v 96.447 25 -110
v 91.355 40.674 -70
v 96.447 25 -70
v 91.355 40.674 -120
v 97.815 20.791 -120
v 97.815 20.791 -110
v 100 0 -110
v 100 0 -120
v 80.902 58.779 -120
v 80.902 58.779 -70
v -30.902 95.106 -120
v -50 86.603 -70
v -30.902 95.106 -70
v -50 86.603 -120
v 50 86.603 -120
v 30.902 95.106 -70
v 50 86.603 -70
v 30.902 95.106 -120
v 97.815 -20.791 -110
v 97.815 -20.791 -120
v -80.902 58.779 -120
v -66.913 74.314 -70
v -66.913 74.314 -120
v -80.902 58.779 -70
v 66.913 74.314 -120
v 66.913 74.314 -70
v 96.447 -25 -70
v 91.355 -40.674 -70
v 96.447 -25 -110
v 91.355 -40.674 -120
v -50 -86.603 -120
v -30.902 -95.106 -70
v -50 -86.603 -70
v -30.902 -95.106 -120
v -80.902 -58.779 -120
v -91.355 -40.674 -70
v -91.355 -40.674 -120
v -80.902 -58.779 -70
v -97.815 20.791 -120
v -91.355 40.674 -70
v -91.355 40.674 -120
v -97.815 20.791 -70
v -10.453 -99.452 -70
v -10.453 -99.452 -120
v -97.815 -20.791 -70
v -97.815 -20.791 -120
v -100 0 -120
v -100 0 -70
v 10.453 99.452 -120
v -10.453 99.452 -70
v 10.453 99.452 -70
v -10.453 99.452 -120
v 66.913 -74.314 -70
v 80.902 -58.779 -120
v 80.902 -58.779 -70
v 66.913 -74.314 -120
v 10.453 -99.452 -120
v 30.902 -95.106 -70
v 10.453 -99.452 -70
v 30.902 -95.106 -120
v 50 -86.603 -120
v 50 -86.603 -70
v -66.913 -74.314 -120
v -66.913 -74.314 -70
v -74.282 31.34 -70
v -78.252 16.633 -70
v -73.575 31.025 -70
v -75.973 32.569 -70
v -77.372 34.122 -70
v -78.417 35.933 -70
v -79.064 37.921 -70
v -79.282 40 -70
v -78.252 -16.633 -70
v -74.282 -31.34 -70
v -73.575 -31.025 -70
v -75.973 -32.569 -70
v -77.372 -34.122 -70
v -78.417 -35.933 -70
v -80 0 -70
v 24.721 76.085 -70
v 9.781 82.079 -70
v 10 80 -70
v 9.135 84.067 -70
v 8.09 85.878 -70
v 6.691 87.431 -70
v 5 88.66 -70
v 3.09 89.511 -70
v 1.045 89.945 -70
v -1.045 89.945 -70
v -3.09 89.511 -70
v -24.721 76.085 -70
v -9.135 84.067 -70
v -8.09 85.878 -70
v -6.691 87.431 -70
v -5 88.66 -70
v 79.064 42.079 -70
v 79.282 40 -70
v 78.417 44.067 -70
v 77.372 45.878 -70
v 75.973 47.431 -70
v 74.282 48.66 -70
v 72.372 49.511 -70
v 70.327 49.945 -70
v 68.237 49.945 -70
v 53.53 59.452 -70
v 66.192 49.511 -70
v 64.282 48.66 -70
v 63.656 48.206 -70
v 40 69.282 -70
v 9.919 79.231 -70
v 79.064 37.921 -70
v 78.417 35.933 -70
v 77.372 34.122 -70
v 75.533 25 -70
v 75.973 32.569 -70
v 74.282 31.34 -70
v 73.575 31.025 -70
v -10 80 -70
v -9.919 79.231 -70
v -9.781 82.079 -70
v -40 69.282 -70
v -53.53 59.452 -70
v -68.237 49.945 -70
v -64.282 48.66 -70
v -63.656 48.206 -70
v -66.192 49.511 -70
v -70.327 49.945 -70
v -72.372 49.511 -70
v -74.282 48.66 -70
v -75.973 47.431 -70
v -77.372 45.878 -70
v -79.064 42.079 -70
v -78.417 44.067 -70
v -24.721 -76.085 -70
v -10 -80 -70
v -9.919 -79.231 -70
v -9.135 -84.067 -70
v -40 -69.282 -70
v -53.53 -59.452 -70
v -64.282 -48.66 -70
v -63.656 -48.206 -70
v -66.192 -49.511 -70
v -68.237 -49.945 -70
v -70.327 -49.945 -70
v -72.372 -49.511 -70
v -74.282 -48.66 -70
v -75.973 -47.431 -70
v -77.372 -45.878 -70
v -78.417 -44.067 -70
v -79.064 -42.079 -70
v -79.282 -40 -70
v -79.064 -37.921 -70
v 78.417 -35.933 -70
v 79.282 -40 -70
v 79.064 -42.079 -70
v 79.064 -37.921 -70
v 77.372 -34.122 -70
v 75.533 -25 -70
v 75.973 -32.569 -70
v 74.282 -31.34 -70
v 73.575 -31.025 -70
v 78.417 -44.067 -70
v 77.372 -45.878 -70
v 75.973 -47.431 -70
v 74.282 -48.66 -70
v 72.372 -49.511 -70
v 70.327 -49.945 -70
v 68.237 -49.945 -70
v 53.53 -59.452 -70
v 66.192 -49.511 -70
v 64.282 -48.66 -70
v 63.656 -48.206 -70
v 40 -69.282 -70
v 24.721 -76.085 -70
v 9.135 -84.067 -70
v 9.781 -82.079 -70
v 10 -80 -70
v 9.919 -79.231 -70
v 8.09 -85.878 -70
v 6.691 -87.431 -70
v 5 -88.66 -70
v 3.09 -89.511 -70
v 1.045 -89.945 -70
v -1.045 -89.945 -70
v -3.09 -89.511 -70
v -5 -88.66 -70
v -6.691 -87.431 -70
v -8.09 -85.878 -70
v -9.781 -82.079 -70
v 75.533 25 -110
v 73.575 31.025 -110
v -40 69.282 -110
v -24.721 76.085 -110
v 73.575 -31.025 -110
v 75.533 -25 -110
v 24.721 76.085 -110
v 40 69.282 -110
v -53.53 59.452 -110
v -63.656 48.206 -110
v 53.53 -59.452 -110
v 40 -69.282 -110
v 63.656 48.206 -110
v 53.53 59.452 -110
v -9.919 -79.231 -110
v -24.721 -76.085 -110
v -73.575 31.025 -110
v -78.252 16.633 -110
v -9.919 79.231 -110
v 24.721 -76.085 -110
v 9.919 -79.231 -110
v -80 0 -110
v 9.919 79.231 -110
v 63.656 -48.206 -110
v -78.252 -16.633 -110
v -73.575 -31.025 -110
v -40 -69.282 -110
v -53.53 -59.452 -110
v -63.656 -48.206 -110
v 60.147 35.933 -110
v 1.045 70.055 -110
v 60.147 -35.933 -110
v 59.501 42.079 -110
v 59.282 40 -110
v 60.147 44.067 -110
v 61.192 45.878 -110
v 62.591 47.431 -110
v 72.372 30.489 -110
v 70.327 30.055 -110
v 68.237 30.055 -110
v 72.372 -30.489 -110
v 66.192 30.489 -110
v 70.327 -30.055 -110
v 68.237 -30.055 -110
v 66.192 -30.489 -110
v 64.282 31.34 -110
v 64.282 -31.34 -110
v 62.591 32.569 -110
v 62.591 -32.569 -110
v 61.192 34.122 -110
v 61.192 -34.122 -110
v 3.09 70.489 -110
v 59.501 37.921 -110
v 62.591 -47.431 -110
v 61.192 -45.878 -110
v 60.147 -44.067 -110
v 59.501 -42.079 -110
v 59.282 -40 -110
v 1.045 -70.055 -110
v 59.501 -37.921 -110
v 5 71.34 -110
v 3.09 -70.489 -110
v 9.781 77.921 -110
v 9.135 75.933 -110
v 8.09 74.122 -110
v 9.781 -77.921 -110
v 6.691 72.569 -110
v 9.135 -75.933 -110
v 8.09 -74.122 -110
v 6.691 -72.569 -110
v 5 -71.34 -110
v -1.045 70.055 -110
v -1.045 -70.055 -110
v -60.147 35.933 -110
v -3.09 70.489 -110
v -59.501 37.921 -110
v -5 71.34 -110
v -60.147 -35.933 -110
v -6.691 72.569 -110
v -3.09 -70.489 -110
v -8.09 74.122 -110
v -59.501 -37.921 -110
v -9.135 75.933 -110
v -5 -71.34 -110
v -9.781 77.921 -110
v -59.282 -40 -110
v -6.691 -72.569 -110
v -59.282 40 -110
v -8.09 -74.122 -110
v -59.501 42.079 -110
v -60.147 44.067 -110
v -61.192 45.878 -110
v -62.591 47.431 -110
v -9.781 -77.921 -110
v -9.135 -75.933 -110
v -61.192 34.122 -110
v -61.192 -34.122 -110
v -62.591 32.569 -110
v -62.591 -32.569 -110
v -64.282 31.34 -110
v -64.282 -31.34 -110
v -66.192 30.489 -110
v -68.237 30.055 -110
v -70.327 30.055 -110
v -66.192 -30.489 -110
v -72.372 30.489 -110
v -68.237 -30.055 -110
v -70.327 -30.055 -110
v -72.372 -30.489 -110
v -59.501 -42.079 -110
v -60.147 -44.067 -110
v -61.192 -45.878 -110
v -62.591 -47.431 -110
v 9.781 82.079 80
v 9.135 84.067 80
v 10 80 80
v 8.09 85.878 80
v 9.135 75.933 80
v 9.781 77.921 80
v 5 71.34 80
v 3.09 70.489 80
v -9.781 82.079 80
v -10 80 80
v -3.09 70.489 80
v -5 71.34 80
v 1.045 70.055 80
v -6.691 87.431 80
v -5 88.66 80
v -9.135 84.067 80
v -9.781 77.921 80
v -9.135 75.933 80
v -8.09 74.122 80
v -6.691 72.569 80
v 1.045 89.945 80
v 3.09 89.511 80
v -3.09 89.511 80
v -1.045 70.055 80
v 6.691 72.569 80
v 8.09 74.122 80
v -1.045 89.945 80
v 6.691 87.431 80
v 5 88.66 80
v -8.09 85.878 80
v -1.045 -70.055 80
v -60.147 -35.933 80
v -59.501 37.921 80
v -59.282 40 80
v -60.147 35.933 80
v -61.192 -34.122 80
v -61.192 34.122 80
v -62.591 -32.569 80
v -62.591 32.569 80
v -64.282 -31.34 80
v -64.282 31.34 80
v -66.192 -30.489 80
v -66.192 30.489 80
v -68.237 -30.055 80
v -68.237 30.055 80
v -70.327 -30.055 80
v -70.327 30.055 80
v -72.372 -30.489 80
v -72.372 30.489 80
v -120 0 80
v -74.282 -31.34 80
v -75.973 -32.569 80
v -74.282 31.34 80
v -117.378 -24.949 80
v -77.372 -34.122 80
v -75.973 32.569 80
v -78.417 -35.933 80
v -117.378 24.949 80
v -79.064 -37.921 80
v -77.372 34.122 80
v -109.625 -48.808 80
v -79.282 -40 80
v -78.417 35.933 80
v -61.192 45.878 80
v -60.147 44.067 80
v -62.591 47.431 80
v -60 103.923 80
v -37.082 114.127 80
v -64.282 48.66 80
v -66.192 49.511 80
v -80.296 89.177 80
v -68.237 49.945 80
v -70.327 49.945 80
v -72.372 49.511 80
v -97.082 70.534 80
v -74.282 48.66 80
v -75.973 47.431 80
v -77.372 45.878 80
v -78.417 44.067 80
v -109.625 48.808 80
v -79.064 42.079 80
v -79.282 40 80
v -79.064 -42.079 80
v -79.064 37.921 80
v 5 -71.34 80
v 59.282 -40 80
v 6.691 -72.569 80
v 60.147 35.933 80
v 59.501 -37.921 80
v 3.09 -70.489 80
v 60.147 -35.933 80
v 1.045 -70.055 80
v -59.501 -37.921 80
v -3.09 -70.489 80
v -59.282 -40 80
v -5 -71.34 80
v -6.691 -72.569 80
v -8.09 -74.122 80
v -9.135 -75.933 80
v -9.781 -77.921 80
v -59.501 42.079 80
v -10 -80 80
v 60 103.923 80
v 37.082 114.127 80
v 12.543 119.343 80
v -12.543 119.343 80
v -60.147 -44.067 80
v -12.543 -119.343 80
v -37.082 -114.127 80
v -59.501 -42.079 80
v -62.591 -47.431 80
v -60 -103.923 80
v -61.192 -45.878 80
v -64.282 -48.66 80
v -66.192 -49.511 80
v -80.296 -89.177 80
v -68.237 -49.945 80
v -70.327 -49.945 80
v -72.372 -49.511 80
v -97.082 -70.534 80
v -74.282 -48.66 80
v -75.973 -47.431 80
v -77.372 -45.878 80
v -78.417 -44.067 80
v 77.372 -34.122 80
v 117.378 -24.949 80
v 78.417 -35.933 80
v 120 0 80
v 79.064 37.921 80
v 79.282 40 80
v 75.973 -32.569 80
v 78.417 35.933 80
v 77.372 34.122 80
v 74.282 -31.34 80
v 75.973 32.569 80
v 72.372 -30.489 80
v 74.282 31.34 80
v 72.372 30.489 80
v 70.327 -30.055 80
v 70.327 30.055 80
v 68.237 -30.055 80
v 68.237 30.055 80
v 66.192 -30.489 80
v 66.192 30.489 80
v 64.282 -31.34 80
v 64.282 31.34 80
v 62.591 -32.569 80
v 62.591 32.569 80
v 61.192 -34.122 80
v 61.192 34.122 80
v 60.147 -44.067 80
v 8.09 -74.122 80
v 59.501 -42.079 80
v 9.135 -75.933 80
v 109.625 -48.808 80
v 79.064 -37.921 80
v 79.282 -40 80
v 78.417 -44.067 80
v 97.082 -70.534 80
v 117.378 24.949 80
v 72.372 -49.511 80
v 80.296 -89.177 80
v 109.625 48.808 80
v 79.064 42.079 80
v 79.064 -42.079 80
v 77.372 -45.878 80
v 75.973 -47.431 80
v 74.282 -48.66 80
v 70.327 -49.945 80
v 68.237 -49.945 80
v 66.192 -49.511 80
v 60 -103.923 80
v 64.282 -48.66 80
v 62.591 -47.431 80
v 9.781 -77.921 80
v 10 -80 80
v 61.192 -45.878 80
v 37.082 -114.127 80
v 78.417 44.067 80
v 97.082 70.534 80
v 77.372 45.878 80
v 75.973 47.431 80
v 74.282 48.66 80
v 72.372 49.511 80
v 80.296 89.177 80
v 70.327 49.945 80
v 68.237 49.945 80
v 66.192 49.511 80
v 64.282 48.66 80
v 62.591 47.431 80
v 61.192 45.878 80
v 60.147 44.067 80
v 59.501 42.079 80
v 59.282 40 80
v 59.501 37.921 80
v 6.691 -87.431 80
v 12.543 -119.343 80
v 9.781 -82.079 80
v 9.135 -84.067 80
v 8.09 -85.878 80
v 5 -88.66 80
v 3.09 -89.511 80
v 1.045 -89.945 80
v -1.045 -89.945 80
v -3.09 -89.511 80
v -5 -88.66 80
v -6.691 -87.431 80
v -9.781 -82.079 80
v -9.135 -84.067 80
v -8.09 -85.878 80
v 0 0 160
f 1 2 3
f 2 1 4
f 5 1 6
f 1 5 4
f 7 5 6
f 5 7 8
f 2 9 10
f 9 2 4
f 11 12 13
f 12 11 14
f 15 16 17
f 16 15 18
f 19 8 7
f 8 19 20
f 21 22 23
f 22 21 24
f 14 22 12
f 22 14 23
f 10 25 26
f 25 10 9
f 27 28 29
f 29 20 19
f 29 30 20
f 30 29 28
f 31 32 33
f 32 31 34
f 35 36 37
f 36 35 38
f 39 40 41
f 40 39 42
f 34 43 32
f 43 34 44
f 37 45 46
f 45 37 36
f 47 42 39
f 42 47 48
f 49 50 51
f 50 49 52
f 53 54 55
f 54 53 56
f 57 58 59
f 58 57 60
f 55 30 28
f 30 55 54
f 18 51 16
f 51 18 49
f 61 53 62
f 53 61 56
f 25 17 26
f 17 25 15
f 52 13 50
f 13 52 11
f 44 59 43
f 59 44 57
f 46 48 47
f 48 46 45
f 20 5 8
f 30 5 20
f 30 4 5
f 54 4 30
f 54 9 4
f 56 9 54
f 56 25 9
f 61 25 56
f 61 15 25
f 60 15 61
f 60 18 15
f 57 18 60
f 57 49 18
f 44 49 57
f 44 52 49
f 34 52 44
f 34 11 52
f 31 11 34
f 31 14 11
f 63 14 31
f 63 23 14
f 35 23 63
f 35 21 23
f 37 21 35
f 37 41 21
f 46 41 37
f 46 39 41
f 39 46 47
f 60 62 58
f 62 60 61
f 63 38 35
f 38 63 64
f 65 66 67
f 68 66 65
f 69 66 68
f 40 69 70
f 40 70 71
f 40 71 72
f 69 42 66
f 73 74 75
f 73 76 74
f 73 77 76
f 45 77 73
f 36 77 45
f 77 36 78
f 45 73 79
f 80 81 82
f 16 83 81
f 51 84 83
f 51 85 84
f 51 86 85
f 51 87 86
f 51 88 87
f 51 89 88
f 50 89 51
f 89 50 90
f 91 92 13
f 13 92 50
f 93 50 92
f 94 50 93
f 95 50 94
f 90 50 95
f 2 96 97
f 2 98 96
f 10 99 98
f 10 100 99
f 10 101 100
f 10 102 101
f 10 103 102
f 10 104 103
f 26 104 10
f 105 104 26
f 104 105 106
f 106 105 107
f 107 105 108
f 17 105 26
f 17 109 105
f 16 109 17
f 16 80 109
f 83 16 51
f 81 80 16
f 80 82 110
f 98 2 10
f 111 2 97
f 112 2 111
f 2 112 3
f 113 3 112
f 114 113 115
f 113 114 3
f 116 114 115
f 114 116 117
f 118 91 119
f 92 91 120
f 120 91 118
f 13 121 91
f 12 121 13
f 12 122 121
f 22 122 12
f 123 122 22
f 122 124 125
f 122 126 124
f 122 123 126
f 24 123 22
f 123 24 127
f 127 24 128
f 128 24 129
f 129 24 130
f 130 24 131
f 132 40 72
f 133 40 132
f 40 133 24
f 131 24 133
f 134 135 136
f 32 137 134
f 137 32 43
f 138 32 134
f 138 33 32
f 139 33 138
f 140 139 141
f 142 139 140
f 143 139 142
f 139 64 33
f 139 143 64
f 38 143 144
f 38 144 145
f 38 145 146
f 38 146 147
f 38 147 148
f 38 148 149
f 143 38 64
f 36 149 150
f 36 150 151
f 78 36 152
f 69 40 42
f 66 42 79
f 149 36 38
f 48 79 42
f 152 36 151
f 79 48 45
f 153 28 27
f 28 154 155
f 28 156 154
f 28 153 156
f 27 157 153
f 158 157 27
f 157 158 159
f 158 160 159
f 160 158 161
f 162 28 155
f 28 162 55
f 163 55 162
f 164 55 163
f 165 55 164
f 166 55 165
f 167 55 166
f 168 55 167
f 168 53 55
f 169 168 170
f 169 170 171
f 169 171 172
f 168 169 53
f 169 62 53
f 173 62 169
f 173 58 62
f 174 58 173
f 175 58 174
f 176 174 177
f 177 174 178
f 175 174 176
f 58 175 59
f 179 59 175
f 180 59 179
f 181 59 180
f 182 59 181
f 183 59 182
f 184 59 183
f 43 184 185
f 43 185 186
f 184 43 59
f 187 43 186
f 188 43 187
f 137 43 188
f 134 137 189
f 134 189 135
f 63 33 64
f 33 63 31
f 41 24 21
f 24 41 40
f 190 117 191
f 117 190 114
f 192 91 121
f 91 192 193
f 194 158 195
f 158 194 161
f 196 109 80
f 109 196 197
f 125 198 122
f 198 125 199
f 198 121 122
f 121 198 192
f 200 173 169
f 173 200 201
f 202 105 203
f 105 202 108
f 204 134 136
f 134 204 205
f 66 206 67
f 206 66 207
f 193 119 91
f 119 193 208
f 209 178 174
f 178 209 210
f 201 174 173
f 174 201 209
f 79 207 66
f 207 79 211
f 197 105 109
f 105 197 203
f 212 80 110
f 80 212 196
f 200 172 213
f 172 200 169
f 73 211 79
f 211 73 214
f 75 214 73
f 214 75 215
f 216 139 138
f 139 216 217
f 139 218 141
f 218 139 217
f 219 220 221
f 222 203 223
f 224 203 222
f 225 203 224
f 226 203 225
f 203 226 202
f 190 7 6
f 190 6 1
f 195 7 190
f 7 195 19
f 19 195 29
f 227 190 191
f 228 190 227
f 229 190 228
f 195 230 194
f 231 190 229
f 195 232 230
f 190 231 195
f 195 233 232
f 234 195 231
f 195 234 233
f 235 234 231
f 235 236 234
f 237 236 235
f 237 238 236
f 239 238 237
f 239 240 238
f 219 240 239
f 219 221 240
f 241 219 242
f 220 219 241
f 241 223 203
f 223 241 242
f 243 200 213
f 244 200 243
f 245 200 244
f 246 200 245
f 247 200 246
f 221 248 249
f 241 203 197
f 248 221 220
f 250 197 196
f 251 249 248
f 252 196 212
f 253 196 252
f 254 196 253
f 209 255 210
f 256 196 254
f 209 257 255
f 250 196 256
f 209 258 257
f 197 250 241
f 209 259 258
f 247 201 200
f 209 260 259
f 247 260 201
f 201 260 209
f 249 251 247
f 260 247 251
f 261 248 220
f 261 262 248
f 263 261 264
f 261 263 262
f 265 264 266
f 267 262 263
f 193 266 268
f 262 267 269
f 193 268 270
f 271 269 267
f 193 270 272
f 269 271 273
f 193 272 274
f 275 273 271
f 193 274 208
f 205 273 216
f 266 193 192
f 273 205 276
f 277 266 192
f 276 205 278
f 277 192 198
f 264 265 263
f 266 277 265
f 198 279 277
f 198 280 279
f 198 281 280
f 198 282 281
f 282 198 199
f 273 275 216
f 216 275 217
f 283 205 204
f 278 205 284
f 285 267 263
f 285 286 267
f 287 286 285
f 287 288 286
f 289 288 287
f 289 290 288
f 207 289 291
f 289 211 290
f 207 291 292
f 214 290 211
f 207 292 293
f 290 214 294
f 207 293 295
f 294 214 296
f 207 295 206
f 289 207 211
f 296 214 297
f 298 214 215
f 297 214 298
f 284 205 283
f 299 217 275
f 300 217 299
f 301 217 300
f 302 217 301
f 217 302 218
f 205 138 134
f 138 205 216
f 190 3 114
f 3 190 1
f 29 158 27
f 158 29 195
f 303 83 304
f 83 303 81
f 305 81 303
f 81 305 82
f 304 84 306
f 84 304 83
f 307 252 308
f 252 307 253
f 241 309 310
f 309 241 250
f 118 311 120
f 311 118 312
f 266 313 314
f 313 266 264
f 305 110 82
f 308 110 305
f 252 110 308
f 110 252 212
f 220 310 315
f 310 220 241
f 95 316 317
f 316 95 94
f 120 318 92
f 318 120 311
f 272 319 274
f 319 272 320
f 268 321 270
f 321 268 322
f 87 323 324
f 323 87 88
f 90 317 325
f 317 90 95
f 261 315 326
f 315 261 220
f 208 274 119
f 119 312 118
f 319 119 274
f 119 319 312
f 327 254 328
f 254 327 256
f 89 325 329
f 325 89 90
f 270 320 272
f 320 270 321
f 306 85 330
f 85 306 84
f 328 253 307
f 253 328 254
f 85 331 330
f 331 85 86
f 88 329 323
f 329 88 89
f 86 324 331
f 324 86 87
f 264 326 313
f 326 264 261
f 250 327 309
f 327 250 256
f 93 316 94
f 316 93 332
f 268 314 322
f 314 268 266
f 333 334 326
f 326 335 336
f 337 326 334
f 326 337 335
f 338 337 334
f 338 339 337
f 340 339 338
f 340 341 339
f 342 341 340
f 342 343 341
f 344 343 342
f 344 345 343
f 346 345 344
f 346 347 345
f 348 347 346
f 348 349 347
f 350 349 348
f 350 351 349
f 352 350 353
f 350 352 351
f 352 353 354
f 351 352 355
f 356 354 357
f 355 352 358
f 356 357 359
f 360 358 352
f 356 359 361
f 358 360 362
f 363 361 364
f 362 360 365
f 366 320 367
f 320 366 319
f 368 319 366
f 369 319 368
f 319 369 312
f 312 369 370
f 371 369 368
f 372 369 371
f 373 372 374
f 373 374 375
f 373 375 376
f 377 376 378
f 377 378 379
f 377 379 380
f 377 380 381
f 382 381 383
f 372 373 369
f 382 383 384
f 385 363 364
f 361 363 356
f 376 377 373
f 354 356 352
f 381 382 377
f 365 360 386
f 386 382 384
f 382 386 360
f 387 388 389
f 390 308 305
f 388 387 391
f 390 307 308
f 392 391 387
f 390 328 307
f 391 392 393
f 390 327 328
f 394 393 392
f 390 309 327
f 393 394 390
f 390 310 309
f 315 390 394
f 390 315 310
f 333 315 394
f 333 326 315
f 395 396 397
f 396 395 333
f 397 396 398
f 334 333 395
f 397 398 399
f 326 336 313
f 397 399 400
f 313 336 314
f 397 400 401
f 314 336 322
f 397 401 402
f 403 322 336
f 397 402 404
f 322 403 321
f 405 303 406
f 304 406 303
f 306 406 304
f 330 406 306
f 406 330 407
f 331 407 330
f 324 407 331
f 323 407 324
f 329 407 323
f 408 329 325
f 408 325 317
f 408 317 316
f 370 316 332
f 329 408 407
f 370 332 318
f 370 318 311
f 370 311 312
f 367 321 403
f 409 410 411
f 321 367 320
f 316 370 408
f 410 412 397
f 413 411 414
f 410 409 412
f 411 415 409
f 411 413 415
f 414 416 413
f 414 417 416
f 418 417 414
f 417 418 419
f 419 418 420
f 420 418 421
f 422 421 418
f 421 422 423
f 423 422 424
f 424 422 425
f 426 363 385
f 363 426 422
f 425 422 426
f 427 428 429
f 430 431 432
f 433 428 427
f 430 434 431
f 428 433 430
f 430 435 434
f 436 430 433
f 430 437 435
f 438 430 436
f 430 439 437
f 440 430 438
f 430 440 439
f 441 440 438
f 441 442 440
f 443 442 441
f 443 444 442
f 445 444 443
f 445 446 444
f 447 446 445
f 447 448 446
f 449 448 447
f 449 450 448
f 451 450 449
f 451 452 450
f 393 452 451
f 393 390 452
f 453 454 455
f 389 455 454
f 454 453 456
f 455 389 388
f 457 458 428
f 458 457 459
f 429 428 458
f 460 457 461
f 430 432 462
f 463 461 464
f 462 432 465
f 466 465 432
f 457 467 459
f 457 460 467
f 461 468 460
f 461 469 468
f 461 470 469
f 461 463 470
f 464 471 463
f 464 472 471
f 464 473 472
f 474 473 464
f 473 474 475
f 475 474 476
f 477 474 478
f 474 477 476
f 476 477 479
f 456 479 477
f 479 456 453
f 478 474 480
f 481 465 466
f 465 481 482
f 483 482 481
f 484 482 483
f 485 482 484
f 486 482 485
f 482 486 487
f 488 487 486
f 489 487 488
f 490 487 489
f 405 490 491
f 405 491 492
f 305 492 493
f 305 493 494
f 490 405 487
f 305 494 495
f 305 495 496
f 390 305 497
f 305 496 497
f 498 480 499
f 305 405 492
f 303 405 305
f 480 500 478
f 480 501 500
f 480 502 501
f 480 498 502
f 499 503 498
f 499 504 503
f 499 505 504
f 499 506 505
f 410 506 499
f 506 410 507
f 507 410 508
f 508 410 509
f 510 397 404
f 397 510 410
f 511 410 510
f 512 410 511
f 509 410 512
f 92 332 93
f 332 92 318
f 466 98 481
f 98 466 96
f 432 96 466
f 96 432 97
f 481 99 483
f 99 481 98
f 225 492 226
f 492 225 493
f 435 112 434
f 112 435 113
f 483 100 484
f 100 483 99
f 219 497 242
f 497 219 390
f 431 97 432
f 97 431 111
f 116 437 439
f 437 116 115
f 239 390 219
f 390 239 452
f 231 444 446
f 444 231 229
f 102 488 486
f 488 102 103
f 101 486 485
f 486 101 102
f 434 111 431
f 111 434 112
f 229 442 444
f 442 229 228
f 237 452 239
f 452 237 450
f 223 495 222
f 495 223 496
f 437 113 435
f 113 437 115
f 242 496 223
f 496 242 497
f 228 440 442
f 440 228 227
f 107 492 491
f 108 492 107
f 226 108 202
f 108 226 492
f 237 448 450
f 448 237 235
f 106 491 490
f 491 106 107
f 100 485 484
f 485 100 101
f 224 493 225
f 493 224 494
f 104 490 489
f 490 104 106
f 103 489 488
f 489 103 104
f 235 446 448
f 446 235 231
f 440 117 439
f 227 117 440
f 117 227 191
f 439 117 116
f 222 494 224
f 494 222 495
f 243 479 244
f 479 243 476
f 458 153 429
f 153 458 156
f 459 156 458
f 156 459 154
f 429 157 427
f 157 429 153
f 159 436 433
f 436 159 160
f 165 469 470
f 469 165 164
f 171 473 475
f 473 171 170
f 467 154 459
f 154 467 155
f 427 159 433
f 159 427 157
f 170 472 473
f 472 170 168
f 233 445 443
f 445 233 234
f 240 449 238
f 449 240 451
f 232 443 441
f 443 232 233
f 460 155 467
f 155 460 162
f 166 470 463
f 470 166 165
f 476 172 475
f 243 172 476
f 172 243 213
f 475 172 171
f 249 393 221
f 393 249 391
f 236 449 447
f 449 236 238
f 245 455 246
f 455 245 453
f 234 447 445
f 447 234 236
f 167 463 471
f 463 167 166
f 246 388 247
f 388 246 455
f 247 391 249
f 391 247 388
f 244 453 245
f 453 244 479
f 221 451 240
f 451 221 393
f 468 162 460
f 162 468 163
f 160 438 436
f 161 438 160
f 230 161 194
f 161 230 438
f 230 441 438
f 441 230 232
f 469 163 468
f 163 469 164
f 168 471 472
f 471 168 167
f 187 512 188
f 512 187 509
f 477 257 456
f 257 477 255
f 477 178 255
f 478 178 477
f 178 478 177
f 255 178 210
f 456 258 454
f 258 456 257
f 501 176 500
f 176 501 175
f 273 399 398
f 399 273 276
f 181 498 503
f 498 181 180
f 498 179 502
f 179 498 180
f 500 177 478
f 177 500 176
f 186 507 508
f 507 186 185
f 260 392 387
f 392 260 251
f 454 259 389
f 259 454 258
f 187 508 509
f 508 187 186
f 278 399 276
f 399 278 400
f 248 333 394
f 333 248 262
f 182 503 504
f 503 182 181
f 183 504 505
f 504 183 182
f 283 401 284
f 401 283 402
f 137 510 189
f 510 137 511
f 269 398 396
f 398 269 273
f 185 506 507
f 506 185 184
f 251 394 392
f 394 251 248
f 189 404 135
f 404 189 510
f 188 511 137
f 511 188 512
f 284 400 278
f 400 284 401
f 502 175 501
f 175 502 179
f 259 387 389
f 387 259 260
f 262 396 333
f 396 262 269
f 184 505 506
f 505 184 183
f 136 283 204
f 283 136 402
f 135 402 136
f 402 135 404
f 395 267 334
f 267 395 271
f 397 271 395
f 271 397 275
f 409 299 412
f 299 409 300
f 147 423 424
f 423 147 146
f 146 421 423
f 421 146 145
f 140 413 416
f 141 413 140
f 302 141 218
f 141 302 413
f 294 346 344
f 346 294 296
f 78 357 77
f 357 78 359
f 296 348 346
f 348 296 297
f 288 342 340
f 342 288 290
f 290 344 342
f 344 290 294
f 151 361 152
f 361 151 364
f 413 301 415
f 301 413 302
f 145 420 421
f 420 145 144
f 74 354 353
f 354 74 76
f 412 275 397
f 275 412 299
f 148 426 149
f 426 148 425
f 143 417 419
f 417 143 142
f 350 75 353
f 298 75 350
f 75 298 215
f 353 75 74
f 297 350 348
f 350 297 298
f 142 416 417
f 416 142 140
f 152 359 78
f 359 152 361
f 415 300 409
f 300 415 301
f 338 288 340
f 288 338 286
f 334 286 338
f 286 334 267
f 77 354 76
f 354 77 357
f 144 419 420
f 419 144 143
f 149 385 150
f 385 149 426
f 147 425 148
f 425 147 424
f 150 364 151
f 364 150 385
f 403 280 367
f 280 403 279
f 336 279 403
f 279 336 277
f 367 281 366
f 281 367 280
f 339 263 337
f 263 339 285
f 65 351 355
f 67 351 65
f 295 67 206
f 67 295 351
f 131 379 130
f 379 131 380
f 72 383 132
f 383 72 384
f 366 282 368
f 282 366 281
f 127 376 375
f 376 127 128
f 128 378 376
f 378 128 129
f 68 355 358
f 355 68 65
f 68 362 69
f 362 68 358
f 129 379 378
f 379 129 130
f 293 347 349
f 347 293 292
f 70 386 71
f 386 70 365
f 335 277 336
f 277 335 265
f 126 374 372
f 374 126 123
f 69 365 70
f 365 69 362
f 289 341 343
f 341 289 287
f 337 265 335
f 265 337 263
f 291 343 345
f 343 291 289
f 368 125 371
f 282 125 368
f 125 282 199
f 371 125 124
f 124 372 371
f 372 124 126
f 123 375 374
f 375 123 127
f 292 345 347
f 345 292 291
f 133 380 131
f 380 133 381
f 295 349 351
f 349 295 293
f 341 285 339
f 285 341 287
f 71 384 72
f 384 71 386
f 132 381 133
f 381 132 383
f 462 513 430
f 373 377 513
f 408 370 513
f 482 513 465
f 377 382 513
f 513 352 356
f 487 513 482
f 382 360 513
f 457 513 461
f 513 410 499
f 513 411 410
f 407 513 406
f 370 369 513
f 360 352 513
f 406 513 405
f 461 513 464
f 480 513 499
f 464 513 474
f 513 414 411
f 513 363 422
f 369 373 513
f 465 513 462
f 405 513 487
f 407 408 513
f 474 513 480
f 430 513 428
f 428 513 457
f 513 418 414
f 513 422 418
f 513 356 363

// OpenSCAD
module example005() {
    translate([0, 0, -120]) {
        difference() {
            cylinder(h = 50, r = 100);
            translate([0, 0, 10]) cylinder(h = 50, r = 80);
            translate([100, 0, 35]) cube(50, center = true);
        }
        for (i = [0 : 5]) {
            echo(360 * i / 6, sin(360 * i / 6) * 80, cos(360 * i / 6) * 80);
            translate([sin(360 * i / 6) * 80, cos(360 * i / 6) * 80, 0])
                cylinder(h = 200, r = 10);
        }
        translate([0, 0, 200])
            cylinder(h = 80, r1 = 120, r2 = 0);
    }
}

echo(version = version());

example005();

// Written by Clifford Wolf <clifford@clifford.at> and Marius
// Kintel <marius@kintel.net>
//
// To the extent possible under law, the author(s) have dedicated all
// copyright and related and neighboring rights to this software to the
// public domain worldwide. This software is distributed without any
// warranty.
//
// You should have received a copy of the CC0 Public Domain
// Dedication along with this software.
// If not, see <http://creativecommons.org/publicdomain/zero/1.0/>.
